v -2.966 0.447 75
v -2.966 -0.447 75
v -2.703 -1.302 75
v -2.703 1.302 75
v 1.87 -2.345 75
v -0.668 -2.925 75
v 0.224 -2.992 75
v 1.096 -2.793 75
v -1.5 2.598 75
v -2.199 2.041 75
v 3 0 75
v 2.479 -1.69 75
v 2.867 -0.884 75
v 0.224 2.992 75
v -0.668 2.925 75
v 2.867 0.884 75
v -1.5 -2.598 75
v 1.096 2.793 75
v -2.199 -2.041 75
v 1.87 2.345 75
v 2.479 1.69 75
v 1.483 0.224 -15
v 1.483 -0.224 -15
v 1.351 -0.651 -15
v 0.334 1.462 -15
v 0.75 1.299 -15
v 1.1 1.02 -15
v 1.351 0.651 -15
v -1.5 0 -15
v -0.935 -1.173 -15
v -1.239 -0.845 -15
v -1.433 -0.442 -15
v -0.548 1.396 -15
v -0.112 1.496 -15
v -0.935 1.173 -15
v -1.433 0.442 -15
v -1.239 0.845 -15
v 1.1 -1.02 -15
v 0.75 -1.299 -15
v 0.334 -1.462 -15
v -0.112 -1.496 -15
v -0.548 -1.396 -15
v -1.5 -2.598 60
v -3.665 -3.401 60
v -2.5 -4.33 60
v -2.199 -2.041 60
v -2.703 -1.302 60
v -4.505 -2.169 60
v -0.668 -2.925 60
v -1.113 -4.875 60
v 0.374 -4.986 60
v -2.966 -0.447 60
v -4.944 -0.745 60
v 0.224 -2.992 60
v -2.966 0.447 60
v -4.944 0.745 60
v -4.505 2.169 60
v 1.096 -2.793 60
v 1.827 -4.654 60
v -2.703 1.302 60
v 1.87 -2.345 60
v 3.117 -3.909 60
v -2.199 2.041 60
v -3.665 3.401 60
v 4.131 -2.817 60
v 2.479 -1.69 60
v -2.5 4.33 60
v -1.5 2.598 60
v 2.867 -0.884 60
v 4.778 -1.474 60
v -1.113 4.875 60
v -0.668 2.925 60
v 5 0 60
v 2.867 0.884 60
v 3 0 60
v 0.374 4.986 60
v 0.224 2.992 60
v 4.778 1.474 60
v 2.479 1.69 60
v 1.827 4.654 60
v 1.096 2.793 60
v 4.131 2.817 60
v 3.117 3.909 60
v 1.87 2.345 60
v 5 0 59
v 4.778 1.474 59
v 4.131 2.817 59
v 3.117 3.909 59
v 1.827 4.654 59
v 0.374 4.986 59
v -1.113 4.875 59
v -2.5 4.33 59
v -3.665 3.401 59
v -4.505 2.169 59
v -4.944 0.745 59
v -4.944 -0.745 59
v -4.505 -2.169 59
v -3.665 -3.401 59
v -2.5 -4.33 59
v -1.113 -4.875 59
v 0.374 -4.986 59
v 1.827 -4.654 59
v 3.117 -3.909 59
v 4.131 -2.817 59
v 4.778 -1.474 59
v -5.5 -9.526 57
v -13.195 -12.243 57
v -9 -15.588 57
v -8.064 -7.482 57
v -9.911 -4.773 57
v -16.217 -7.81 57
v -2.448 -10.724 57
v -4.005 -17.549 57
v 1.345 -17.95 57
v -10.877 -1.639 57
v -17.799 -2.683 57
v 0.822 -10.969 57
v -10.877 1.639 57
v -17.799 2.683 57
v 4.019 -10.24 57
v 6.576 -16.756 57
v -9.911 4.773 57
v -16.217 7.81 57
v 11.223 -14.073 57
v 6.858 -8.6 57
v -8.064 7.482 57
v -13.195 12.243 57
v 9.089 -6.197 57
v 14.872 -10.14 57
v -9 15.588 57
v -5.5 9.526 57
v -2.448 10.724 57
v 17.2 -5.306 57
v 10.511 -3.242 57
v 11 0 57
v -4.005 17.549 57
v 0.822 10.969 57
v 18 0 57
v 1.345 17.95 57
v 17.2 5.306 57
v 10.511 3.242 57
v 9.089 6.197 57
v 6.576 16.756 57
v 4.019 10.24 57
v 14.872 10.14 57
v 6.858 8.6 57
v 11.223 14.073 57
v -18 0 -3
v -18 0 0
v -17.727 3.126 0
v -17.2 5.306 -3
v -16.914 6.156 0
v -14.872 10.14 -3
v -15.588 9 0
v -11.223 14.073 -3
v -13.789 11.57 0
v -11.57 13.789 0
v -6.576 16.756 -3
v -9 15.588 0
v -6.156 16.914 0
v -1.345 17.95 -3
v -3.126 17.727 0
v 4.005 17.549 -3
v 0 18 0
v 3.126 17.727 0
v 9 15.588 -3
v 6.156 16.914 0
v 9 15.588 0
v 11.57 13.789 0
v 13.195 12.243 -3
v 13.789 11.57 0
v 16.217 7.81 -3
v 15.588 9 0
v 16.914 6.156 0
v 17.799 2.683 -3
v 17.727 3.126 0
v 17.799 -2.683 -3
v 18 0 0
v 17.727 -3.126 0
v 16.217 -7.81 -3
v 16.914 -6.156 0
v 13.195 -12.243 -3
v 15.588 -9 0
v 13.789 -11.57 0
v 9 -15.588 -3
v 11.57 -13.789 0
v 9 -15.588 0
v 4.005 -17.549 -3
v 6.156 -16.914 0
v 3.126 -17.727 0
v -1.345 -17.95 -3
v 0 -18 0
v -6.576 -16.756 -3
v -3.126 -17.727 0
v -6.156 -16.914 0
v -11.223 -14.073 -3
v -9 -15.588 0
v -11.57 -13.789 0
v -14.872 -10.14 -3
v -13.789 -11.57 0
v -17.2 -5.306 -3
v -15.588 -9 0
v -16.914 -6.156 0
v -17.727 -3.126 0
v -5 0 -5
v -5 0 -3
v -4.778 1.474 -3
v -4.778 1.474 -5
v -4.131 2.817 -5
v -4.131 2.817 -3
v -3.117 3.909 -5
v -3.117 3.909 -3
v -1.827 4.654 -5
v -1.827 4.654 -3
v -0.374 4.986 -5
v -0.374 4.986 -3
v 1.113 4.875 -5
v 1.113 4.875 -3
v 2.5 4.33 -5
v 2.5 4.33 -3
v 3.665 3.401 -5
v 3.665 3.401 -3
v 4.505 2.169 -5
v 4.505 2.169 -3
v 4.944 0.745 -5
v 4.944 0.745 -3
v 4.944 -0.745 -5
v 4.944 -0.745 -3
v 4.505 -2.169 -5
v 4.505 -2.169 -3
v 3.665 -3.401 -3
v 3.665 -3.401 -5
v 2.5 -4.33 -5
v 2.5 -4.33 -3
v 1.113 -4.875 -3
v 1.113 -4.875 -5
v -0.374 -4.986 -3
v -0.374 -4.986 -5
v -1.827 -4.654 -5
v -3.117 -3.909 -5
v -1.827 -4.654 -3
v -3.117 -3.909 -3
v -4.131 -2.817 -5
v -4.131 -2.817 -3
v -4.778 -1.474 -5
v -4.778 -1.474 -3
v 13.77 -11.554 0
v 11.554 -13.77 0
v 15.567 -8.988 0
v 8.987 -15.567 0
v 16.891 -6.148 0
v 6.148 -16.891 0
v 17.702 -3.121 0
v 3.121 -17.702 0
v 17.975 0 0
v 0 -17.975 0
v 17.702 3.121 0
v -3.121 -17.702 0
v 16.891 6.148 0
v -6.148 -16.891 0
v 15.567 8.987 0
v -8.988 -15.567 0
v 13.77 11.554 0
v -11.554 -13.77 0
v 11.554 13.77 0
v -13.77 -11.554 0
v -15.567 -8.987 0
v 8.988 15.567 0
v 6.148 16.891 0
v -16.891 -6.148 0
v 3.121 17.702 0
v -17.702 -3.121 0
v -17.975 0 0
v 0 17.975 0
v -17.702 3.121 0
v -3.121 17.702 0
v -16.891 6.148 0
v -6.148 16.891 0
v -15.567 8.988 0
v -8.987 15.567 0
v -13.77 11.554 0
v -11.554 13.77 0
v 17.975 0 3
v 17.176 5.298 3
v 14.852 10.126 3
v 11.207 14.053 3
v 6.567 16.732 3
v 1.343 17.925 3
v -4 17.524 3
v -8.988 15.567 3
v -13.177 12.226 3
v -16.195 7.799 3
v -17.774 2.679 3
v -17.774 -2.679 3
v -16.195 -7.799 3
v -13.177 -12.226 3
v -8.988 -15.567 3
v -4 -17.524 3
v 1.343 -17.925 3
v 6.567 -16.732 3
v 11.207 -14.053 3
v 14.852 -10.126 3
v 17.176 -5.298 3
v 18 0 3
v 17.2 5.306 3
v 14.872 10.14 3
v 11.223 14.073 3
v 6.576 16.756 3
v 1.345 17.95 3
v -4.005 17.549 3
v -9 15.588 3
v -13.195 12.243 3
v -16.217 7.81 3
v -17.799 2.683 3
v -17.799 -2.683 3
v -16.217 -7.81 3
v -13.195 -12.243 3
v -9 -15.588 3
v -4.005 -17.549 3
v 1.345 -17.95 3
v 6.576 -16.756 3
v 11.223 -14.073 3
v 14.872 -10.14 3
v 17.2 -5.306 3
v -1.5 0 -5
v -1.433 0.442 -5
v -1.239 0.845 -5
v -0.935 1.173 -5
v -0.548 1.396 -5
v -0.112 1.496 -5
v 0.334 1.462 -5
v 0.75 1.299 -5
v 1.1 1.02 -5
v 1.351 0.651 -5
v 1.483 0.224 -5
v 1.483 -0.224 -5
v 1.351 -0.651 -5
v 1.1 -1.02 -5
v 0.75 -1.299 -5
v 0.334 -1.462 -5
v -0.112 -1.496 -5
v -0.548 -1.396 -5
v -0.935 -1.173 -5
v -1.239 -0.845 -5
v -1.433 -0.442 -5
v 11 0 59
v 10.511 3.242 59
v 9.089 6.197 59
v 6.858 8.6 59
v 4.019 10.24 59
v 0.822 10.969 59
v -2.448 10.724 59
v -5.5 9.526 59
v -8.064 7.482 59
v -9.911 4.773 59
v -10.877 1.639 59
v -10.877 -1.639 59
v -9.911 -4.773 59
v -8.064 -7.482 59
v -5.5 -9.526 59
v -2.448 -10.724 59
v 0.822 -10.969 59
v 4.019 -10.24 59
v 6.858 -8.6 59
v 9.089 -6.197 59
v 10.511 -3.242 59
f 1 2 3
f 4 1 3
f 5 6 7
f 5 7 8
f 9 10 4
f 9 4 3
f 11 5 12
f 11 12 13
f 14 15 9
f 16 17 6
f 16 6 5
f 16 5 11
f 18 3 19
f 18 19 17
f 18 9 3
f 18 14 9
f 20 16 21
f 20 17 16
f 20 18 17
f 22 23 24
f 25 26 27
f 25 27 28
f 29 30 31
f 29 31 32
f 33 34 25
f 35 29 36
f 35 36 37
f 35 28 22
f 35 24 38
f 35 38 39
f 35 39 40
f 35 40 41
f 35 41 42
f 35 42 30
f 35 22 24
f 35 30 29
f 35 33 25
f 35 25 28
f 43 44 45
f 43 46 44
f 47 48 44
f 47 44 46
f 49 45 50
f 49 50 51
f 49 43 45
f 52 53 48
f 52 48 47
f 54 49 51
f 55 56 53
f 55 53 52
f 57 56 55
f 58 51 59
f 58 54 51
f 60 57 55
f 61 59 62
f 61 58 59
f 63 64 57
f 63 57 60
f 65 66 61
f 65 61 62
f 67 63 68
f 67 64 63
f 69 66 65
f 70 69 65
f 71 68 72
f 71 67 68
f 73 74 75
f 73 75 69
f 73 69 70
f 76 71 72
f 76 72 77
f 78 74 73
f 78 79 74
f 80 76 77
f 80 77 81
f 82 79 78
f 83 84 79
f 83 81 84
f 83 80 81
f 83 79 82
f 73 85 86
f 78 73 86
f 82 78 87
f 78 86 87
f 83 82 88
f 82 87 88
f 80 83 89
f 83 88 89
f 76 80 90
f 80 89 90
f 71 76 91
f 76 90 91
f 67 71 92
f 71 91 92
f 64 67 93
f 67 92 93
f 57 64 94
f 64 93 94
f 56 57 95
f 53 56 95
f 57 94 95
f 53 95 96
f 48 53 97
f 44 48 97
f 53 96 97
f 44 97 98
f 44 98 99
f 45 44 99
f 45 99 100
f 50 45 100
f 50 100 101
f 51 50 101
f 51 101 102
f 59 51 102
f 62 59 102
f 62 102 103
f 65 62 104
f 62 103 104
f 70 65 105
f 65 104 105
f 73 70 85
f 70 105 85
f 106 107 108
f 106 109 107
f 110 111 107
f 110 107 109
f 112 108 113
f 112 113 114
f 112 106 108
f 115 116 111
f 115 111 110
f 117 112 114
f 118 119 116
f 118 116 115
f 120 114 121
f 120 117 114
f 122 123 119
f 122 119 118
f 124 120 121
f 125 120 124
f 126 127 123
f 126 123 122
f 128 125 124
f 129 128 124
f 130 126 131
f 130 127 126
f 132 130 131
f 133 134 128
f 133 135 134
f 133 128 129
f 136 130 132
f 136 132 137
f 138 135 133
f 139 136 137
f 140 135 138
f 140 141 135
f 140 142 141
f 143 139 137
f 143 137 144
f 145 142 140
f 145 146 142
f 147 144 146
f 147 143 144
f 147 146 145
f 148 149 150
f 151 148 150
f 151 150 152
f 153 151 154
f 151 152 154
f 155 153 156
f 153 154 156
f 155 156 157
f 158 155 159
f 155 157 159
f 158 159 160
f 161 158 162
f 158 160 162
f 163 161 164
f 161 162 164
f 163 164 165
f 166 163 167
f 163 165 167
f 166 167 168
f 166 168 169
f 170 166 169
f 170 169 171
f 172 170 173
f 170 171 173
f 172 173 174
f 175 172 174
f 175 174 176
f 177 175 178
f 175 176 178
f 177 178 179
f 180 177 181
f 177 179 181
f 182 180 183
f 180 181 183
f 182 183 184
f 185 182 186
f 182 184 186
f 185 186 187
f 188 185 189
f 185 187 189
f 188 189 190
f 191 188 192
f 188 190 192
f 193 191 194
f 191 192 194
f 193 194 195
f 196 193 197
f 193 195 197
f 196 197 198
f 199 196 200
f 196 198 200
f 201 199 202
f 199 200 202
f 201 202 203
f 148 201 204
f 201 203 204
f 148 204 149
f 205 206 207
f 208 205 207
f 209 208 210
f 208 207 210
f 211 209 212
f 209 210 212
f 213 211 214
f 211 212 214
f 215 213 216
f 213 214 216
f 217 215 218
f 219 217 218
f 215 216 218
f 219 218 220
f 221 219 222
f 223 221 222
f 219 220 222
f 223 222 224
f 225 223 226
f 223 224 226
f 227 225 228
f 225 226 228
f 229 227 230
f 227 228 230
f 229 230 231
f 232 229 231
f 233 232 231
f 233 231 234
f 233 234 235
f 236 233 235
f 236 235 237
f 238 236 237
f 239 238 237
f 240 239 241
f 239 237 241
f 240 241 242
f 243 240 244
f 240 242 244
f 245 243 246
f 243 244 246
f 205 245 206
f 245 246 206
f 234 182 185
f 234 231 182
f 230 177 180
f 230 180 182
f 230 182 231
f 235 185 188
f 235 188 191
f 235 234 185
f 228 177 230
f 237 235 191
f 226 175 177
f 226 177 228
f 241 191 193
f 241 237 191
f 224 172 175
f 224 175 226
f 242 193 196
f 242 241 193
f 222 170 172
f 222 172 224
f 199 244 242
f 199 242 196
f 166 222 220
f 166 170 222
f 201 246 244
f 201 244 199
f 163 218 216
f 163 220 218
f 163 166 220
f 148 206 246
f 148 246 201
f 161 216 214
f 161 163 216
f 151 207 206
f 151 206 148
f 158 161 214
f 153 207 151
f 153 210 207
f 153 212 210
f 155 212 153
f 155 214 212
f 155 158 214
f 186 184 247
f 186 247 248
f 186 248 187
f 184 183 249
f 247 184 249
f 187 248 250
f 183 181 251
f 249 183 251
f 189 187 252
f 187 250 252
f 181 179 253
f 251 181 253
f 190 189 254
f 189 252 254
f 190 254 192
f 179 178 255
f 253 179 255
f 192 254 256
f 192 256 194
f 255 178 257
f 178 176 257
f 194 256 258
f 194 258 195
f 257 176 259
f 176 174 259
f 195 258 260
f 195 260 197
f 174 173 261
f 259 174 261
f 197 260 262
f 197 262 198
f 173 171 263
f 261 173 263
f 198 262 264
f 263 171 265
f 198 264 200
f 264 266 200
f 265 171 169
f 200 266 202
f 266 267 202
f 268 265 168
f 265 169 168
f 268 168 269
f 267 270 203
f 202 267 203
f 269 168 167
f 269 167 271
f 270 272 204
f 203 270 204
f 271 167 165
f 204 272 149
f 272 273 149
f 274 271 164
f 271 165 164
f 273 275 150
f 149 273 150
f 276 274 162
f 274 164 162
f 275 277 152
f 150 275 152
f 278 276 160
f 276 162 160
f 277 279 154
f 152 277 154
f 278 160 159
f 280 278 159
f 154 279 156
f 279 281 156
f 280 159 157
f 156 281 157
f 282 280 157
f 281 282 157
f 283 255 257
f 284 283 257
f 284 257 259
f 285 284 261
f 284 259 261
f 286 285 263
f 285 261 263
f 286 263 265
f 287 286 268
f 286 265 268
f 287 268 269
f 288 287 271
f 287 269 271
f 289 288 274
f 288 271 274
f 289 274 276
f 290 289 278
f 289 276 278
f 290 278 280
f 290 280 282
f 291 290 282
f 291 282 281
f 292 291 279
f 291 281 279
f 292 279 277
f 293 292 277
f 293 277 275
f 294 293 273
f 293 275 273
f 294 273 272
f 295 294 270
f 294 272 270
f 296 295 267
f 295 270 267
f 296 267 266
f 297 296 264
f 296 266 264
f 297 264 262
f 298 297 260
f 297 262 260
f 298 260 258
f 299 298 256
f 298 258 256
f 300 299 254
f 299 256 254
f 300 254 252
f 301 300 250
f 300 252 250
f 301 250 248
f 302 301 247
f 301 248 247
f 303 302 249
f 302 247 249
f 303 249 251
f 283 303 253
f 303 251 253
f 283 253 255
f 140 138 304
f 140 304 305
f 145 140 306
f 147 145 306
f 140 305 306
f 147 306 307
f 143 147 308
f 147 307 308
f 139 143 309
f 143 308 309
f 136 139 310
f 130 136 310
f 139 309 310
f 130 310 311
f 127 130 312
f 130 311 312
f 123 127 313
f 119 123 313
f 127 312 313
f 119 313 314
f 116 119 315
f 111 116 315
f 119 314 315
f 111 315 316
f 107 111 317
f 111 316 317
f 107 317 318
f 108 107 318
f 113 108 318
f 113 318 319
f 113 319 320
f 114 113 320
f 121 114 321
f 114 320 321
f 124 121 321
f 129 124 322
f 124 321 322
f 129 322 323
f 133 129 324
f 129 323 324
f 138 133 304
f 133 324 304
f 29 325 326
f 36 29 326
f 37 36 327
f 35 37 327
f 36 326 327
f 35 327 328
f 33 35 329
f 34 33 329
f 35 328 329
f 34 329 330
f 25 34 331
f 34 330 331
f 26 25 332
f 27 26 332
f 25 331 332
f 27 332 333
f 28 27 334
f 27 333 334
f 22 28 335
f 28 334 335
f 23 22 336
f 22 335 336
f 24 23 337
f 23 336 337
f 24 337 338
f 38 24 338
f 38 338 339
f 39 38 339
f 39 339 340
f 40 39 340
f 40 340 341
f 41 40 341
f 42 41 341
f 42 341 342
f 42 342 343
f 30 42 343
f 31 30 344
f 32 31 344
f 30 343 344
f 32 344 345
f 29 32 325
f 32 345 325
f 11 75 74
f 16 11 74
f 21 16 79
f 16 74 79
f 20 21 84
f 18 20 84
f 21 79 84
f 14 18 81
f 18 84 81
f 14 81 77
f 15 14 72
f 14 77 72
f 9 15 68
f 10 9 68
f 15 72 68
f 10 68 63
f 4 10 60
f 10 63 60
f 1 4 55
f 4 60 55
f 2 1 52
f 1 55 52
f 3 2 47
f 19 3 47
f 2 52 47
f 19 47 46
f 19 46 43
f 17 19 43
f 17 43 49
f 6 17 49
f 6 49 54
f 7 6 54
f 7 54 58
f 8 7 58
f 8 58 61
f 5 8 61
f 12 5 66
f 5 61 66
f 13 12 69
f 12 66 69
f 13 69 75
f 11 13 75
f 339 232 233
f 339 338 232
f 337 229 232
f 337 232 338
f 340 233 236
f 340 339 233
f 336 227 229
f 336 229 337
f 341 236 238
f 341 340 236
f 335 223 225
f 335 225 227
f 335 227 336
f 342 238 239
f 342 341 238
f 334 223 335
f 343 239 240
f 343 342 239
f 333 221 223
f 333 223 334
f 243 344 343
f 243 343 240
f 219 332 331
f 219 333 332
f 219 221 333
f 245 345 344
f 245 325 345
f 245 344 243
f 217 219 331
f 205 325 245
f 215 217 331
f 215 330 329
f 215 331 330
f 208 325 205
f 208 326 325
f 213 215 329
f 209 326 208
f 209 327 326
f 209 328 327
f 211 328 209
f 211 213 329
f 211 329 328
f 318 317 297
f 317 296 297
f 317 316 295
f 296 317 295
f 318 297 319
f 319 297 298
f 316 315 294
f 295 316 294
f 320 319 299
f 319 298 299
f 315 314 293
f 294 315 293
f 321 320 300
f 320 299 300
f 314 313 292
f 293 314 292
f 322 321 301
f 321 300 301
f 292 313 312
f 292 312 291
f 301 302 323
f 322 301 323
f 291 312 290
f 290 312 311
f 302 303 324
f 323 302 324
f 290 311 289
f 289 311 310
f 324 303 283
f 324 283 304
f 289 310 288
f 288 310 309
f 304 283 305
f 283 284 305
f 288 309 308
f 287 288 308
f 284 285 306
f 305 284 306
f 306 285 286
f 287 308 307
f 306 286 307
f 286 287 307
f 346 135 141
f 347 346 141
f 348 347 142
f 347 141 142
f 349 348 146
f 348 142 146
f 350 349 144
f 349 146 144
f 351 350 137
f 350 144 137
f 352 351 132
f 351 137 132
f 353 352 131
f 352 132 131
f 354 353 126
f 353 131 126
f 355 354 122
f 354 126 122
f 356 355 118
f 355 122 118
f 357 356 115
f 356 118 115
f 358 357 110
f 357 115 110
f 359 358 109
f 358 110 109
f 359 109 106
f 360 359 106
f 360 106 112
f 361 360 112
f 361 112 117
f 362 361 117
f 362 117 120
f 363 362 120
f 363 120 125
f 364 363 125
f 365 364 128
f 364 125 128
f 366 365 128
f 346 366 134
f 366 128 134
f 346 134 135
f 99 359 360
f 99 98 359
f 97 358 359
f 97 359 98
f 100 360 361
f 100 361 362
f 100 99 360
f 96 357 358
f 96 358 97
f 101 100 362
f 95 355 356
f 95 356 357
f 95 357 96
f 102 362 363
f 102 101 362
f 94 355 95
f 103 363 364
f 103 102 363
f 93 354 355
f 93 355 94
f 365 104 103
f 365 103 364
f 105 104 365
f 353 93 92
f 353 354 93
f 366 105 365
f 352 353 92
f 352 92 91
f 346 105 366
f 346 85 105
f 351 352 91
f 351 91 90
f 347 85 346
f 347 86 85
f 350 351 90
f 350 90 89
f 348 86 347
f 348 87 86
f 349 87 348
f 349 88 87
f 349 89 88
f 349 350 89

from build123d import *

# Parameters (mm, degrees)
SKETCH_1_R       = 17.975
EXTRUDE_1_DEPTH  = 3
SKETCH_2_R       = 18
EXTRUDE_2_DEPTH  = 50
SKETCH_3_R       = 18
EXTRUDE_3_DEPTH  = 4
SKETCH_4_R       = 11
EXTRUDE_4_DEPTH  = 2
SKETCH_5_R       = 5
EXTRUDE_6_DEPTH  = 1
SKETCH_6_R       = 3
EXTRUDE_7_DEPTH  = 15
SKETCH_8_R       = 18
EXTRUDE_9_DEPTH  = 3
SKETCH_9_R       = 5
EXTRUDE_10_DEPTH = 2
SKETCH_10_R      = 1.5
EXTRUDE_11_DEPTH = 10


with BuildPart() as part:
    # 草圖1 → 填料-伸長1 (new body)
    with BuildSketch(Plane.XY):
        Circle(SKETCH_1_R)
    extrude(amount=EXTRUDE_1_DEPTH)

    # 草圖2 → 填料-伸長2 (add)
    with BuildSketch(Plane.XY.offset(3)):
        Circle(SKETCH_2_R)
    extrude(amount=EXTRUDE_2_DEPTH)

    # 草圖3 → 填料-伸長3 (add)
    with BuildSketch(Plane.XY.offset(53)):
        Circle(SKETCH_3_R)
    extrude(amount=EXTRUDE_3_DEPTH)

    # 草圖4 → 填料-伸長4 (add)
    with BuildSketch(Plane.XY.offset(57)):
        Circle(SKETCH_4_R)
    extrude(amount=EXTRUDE_4_DEPTH)

    # 草圖5 → 填料-伸長6 (add)
    with BuildSketch(Plane.XY.offset(59)):
        Circle(SKETCH_5_R)
    extrude(amount=EXTRUDE_6_DEPTH)

    # 草圖6 → 填料-伸長7 (add)
    with BuildSketch(Plane.XY.offset(60)):
        Circle(SKETCH_6_R)
    extrude(amount=EXTRUDE_7_DEPTH)

    # 草圖8 → 填料-伸長9 (add)
    with BuildSketch(Plane(origin=(0, 0, 0), x_dir=(-1, 0, 0), z_dir=(0, 0, -1))):
        Circle(SKETCH_8_R)
    extrude(amount=EXTRUDE_9_DEPTH)

    # 草圖9 → 填料-伸長10 (add)
    with BuildSketch(Plane(origin=(0, 0, -3), x_dir=(-1, 0, 0), z_dir=(0, 0, -1))):
        Circle(SKETCH_9_R)
    extrude(amount=EXTRUDE_10_DEPTH)

    # 草圖10 → 填料-伸長11 (add)
    with BuildSketch(Plane(origin=(0, 0, -5), x_dir=(-1, 0, 0), z_dir=(0, 0, -1))):
        Circle(SKETCH_10_R)
    extrude(amount=EXTRUDE_11_DEPTH)


solid = part.part
